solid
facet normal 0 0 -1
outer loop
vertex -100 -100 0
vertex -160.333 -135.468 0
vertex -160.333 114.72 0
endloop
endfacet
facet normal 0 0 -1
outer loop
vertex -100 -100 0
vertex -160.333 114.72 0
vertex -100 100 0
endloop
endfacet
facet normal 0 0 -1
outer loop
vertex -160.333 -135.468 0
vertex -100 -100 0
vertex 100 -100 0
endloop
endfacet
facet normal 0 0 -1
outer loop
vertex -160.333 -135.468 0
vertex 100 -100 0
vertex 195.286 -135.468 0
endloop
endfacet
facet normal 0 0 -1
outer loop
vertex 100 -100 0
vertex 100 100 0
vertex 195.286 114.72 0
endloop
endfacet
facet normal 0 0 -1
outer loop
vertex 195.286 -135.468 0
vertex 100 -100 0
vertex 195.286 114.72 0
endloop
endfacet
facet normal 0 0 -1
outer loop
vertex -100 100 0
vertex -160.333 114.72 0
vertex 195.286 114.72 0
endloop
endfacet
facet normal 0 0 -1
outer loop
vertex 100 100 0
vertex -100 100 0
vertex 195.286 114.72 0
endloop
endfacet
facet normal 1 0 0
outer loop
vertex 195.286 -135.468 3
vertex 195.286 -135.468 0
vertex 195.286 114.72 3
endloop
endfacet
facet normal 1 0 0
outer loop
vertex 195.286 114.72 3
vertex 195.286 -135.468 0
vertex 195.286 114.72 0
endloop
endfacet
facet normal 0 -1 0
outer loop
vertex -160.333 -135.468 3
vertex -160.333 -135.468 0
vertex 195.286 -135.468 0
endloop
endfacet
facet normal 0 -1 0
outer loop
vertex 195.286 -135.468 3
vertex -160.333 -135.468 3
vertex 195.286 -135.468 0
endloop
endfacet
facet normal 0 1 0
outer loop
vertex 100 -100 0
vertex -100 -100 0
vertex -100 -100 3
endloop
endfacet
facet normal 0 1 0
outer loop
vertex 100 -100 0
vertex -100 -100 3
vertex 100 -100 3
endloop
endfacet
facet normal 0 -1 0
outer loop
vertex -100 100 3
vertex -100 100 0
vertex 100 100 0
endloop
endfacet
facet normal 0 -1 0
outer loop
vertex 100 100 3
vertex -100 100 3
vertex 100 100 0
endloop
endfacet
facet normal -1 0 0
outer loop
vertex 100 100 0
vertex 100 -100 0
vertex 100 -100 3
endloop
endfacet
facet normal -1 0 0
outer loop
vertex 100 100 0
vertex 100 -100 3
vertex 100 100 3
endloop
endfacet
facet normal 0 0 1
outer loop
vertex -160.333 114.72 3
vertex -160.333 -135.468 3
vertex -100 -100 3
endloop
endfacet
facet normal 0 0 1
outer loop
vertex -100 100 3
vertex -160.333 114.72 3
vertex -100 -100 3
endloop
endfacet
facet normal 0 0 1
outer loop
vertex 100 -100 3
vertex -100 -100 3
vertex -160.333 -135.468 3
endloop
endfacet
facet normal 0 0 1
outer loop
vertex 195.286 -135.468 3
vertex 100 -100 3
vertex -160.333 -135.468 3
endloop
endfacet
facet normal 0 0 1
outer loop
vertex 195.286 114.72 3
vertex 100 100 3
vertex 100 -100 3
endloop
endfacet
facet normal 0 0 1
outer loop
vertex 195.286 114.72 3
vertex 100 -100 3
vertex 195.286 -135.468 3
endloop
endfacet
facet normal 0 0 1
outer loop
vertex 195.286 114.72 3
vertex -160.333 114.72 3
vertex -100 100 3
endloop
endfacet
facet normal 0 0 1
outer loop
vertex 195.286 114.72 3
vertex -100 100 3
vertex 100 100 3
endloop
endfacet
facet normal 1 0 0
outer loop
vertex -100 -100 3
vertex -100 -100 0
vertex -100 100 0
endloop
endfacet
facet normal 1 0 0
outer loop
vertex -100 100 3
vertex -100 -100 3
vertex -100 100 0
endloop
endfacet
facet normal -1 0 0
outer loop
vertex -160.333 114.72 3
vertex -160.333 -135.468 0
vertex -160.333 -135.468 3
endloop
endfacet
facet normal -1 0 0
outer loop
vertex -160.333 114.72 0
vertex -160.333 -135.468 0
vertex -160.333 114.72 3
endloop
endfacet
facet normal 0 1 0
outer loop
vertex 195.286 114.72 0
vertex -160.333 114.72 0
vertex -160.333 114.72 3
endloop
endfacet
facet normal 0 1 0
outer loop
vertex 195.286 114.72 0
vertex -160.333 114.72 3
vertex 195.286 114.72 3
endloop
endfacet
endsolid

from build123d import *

# Parameters (mm, degrees)
F0_W     = 355.619341
F0_H     = 250.18812
F0_W_2   = 200
F0_H_2   = 200
F1_DEPTH = 3


with BuildPart() as f1:
    # F0 (on Top) → F1 (new body)
    with BuildSketch(Plane.XY):
        with Locations((17.476574, -10.373693)):
            Rectangle(F0_W, F0_H)
        Rectangle(F0_W_2, F0_H_2, mode=Mode.SUBTRACT)
    extrude(amount=F1_DEPTH)


solid = f1.part
